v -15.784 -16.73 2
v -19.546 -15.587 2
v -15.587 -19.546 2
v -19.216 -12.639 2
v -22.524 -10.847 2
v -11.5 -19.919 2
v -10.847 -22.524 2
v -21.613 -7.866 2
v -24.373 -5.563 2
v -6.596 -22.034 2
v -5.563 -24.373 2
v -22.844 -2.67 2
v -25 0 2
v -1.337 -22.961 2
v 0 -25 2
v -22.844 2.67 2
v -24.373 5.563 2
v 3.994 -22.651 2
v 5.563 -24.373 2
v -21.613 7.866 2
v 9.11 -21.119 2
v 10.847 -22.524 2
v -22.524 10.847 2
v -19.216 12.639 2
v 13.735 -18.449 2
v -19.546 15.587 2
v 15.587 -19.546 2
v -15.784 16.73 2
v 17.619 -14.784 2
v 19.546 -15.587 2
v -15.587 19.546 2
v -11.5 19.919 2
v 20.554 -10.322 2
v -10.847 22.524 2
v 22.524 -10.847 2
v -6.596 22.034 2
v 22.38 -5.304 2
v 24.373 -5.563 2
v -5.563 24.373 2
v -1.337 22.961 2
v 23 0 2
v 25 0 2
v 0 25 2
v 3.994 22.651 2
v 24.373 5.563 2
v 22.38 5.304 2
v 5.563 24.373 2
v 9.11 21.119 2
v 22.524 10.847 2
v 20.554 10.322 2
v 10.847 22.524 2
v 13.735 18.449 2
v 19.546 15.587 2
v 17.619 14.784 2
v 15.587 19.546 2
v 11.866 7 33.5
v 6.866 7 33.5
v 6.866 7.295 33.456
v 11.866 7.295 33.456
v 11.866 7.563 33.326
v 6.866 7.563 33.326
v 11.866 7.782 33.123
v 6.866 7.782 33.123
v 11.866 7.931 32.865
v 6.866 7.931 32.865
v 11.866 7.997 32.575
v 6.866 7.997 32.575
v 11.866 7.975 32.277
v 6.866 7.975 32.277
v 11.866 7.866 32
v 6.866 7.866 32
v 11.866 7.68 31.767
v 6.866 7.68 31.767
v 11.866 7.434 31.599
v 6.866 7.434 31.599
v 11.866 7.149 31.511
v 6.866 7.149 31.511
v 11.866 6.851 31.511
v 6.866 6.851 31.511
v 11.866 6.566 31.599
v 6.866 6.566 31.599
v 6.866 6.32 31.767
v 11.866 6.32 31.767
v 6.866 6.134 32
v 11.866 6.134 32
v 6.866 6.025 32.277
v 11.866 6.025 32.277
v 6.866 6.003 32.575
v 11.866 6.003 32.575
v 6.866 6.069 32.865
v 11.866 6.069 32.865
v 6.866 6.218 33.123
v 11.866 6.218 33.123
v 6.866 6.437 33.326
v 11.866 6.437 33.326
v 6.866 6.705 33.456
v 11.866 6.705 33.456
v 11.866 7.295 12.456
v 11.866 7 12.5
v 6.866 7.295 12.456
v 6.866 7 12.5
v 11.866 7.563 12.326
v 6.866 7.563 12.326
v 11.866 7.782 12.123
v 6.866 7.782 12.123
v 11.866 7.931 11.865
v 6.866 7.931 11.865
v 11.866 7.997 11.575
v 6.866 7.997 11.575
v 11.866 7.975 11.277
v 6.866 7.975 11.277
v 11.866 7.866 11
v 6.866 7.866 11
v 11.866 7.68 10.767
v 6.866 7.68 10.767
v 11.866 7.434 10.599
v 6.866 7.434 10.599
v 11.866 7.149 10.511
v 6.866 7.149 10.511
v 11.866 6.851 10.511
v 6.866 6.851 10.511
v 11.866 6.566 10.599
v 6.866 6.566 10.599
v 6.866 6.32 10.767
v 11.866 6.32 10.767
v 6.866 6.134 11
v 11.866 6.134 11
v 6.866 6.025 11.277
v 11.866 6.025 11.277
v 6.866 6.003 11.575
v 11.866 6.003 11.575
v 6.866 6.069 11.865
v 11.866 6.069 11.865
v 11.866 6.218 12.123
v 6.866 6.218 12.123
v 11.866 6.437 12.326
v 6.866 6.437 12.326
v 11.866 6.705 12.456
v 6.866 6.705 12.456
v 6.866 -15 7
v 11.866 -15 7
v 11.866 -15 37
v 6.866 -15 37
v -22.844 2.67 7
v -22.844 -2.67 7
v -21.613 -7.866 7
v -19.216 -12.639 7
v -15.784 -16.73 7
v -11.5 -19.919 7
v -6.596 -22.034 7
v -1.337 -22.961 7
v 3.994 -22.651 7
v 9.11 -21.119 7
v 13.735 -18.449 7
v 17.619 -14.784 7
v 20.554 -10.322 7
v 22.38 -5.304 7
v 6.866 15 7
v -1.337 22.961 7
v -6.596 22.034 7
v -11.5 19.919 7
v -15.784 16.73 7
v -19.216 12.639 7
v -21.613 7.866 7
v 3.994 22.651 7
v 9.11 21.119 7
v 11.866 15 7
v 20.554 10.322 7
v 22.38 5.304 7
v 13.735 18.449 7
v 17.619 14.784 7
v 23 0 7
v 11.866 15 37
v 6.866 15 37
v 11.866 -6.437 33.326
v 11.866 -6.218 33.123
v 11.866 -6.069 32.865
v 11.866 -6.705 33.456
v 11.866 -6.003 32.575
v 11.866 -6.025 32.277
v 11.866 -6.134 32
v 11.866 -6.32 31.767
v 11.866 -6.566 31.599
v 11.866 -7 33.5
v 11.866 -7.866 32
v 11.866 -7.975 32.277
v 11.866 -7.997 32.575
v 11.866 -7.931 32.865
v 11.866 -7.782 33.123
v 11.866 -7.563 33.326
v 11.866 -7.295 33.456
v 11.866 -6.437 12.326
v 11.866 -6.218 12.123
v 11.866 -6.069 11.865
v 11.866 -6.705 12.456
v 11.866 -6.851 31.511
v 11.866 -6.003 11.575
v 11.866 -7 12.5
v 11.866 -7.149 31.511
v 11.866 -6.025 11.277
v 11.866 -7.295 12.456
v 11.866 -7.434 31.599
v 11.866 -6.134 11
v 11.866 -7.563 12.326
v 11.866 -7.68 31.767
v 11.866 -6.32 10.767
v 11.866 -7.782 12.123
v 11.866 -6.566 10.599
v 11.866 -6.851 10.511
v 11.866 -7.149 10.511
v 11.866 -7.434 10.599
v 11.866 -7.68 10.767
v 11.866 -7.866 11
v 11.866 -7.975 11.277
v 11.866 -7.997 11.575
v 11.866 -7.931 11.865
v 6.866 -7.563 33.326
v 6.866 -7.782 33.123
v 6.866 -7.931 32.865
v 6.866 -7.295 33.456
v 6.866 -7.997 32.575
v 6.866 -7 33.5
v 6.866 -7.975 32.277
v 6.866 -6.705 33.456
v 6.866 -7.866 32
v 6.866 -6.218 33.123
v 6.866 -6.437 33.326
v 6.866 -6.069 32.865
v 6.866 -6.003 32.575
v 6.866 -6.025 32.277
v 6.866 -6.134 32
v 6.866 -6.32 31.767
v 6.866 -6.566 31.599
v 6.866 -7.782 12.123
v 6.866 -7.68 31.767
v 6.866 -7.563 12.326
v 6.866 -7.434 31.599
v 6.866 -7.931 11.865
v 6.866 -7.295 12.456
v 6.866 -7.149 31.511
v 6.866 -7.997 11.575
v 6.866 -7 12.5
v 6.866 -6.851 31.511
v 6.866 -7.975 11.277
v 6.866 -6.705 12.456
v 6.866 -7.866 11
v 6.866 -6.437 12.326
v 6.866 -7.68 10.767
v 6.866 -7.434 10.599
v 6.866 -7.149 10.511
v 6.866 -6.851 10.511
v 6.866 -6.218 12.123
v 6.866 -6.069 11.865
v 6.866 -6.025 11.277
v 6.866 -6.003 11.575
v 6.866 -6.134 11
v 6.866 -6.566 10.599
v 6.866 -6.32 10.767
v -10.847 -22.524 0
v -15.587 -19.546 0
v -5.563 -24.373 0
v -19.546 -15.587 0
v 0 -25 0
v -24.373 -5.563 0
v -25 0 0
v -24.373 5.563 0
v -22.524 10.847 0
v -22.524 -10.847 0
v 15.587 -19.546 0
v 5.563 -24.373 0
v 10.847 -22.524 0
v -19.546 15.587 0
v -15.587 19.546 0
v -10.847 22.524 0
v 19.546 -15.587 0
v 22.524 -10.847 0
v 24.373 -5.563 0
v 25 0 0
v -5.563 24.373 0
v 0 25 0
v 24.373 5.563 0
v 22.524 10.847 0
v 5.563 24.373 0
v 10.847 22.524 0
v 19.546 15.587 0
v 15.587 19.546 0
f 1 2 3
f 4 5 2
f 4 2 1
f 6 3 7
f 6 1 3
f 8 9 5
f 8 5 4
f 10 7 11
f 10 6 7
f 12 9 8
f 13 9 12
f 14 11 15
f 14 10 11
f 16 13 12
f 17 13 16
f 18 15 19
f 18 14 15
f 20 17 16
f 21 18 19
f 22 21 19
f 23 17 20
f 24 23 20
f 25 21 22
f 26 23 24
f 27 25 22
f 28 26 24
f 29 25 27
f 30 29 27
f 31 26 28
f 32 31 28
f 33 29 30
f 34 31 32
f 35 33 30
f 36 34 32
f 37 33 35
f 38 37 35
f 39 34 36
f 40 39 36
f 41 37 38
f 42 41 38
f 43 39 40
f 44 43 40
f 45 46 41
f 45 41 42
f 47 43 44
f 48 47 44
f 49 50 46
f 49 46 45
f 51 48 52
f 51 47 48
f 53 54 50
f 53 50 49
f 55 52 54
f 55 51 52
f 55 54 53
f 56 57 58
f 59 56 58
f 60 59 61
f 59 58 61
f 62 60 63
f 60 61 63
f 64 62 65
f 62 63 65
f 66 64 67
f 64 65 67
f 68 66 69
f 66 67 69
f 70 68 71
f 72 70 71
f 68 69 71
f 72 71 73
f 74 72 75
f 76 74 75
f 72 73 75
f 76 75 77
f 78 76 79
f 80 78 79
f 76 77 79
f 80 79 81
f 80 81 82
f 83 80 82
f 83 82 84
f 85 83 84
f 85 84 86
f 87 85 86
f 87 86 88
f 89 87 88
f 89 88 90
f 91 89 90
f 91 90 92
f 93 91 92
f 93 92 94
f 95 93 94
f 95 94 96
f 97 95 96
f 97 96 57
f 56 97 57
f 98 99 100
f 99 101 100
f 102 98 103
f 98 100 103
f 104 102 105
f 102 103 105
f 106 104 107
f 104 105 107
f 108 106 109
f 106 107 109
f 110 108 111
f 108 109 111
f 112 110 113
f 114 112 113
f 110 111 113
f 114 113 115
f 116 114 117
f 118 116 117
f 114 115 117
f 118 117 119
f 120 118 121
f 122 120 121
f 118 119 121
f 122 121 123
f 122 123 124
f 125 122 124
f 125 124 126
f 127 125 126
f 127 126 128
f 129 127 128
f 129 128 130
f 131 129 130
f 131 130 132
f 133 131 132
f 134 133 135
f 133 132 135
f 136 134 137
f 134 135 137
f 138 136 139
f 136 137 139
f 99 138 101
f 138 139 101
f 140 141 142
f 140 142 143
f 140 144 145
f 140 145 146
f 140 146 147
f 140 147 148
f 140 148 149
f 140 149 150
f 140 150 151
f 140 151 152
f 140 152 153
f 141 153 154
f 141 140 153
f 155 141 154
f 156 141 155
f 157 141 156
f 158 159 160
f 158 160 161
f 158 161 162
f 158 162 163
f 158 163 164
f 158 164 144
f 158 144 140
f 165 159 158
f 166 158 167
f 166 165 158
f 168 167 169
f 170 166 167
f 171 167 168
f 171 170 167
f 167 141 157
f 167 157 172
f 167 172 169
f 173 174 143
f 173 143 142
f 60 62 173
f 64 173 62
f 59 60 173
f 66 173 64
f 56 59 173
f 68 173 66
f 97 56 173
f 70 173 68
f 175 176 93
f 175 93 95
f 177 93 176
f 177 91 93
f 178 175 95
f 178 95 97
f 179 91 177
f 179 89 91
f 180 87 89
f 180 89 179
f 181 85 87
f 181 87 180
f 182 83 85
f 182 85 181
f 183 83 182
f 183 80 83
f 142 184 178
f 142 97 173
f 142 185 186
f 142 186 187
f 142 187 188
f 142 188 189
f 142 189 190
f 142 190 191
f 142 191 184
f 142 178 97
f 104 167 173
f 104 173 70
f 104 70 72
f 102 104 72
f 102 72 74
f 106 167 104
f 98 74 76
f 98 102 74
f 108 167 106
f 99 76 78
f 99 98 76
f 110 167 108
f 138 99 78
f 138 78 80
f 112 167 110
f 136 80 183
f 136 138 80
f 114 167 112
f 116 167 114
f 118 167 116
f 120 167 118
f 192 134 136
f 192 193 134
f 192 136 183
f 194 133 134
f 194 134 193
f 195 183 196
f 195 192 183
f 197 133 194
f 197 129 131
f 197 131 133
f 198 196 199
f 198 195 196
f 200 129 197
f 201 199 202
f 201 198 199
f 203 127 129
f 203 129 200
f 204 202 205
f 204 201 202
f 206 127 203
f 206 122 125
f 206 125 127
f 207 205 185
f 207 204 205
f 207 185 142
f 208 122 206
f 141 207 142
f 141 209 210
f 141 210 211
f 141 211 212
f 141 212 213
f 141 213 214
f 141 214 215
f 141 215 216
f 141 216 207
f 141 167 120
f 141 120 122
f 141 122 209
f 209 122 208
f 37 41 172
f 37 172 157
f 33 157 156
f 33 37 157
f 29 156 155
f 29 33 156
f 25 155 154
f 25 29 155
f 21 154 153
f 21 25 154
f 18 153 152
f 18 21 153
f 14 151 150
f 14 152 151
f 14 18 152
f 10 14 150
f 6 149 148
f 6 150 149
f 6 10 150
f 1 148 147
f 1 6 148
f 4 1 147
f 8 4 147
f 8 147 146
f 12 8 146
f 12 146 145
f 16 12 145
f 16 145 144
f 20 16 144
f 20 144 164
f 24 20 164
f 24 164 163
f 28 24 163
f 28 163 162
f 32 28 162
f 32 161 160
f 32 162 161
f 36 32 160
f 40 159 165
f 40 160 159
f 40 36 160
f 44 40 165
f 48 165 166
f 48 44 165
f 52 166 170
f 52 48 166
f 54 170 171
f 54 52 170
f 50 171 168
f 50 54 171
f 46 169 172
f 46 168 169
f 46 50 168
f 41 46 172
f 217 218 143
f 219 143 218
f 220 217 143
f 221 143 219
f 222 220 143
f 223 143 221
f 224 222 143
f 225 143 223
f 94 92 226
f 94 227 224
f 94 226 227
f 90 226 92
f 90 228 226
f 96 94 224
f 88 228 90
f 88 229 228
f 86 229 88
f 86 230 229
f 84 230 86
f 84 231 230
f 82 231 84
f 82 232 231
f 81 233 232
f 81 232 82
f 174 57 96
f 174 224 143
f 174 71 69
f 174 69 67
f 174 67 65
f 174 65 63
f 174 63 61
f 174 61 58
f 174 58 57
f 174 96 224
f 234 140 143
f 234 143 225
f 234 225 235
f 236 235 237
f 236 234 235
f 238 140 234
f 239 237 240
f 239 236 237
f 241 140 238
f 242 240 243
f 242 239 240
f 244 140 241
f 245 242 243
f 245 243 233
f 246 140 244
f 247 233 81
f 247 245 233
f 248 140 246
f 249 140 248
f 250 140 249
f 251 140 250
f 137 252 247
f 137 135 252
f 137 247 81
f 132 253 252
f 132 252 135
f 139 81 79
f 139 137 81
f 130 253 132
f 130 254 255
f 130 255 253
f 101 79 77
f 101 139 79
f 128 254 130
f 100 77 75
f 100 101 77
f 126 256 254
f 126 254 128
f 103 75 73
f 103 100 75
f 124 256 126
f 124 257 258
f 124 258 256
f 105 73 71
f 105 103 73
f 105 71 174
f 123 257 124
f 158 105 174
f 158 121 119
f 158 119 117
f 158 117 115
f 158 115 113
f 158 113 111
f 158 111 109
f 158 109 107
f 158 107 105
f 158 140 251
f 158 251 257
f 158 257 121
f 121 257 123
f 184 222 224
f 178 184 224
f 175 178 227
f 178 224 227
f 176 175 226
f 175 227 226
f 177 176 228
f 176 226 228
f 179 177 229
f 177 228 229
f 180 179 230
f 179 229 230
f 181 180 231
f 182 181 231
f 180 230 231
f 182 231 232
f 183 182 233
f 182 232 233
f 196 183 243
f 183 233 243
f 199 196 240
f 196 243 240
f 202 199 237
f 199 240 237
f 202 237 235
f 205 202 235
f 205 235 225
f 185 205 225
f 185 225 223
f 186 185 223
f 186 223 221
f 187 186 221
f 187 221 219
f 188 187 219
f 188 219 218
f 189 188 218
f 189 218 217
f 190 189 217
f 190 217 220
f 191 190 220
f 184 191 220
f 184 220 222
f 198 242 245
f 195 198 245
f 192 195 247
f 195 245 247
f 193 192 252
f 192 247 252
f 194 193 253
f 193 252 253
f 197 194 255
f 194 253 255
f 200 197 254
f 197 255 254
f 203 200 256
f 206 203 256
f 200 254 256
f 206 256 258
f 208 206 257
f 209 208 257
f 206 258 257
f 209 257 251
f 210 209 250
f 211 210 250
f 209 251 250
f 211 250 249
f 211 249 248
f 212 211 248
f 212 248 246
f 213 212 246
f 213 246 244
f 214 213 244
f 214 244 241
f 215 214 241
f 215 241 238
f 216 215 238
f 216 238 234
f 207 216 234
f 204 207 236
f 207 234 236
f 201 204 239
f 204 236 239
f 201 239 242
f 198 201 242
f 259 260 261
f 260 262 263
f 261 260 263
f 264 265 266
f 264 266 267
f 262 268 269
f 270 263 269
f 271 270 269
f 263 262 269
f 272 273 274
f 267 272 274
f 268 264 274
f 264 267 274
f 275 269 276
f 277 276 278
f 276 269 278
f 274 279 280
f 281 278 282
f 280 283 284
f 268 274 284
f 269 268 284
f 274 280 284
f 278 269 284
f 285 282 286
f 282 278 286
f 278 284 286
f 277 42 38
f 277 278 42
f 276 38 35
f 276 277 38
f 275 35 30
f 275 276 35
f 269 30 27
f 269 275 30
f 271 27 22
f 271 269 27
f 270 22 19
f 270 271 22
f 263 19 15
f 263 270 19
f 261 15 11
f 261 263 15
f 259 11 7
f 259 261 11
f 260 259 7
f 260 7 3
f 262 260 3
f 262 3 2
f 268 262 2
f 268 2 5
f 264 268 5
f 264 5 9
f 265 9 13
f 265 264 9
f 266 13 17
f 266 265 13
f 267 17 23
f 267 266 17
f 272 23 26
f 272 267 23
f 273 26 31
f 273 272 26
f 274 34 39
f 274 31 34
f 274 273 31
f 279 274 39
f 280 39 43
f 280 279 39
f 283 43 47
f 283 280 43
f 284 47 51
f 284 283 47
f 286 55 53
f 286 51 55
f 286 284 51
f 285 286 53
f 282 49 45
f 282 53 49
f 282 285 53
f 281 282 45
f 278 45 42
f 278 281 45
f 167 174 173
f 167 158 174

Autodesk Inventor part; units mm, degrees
ref_plane "YZ Plane" through (0, 0, 0) normal (1, 0, 0) x (0, 1, 0)
ref_plane "XZ Plane" through (0, 0, 0) normal (0, 1, 0) x (-1, 0, 0)
ref_plane "XY Plane" through (0, 0, 0) normal (0, 0, 1) x (1, 0, 0)
sketch "Szkic1" plane through (0, 0, 0) normal (0, 0, 1) x (1, 0, 0)
  circle A0 centre (0, 0) radius 25
  dimension "d0" = 50
extrude "Wyciągnięcie proste1" add sketch "Szkic1" along normal blind 2
sketch "Szkic2" plane through (0, 0, 2) normal (0, 0, 1) x (1, 0, 0)
  circle A0 centre (0, 0) radius 23
  dimension "d3" = 46
extrude "Wyciągnięcie proste2" add sketch "Szkic2" along normal blind 5
sketch "Szkic3" plane through (0, 0, 7) normal (0, 0, 1) x (1, 0, 0)
  line L0 (6.8662, 15) -> (11.8662, 15)
  line L1 (11.8662, 15) -> (11.8662, -15)
  line L2 (11.8662, -15) -> (6.8662, -15)
  line L3 (6.8662, -15) -> (6.8662, 15)
  point P0 (0, 0)
  point P1 (6.8662, 0)
  dimension "d6" = 30
  dimension "d7" = 5
extrude "Wyciągnięcie proste3" add sketch "Szkic3" along normal blind 30
sketch "Szkic4" plane through (6.8662, -15, 7) normal (-1, 0, 0) x (0, 0, 1)
  circle A0 centre (4.5, 22) radius 1
  circle A1 centre (25.5, 22) radius 1
  circle A2 centre (4.5, 8) radius 1
  circle A3 centre (25.5, 8) radius 1
  line L0 (4.5, 22) -> (25.5, 22)
  line L1 (4.5, 22) -> (4.5, 8)
  line L2 (0, 30) -> (30, 30) projected
  line L3 (30, 30) -> (30, 0) projected
  point P0 (-7, 15)
  point P1 (15, 22)
  point P2 (15, 30)
  point P3 (4.5, 15)
  point P4 (30, 15)
  dimension "d10" = 2
  dimension "d11" = 2
  dimension "d12" = 2
  dimension "d13" = 2
  dimension "d14" = 14
  dimension "d15" = 21
extrude "Wyciągnięcie proste4" cut sketch "Szkic4" against normal blind 50
properties part number "camera_poprywka" material "Tworzywo sztuczne PET"
